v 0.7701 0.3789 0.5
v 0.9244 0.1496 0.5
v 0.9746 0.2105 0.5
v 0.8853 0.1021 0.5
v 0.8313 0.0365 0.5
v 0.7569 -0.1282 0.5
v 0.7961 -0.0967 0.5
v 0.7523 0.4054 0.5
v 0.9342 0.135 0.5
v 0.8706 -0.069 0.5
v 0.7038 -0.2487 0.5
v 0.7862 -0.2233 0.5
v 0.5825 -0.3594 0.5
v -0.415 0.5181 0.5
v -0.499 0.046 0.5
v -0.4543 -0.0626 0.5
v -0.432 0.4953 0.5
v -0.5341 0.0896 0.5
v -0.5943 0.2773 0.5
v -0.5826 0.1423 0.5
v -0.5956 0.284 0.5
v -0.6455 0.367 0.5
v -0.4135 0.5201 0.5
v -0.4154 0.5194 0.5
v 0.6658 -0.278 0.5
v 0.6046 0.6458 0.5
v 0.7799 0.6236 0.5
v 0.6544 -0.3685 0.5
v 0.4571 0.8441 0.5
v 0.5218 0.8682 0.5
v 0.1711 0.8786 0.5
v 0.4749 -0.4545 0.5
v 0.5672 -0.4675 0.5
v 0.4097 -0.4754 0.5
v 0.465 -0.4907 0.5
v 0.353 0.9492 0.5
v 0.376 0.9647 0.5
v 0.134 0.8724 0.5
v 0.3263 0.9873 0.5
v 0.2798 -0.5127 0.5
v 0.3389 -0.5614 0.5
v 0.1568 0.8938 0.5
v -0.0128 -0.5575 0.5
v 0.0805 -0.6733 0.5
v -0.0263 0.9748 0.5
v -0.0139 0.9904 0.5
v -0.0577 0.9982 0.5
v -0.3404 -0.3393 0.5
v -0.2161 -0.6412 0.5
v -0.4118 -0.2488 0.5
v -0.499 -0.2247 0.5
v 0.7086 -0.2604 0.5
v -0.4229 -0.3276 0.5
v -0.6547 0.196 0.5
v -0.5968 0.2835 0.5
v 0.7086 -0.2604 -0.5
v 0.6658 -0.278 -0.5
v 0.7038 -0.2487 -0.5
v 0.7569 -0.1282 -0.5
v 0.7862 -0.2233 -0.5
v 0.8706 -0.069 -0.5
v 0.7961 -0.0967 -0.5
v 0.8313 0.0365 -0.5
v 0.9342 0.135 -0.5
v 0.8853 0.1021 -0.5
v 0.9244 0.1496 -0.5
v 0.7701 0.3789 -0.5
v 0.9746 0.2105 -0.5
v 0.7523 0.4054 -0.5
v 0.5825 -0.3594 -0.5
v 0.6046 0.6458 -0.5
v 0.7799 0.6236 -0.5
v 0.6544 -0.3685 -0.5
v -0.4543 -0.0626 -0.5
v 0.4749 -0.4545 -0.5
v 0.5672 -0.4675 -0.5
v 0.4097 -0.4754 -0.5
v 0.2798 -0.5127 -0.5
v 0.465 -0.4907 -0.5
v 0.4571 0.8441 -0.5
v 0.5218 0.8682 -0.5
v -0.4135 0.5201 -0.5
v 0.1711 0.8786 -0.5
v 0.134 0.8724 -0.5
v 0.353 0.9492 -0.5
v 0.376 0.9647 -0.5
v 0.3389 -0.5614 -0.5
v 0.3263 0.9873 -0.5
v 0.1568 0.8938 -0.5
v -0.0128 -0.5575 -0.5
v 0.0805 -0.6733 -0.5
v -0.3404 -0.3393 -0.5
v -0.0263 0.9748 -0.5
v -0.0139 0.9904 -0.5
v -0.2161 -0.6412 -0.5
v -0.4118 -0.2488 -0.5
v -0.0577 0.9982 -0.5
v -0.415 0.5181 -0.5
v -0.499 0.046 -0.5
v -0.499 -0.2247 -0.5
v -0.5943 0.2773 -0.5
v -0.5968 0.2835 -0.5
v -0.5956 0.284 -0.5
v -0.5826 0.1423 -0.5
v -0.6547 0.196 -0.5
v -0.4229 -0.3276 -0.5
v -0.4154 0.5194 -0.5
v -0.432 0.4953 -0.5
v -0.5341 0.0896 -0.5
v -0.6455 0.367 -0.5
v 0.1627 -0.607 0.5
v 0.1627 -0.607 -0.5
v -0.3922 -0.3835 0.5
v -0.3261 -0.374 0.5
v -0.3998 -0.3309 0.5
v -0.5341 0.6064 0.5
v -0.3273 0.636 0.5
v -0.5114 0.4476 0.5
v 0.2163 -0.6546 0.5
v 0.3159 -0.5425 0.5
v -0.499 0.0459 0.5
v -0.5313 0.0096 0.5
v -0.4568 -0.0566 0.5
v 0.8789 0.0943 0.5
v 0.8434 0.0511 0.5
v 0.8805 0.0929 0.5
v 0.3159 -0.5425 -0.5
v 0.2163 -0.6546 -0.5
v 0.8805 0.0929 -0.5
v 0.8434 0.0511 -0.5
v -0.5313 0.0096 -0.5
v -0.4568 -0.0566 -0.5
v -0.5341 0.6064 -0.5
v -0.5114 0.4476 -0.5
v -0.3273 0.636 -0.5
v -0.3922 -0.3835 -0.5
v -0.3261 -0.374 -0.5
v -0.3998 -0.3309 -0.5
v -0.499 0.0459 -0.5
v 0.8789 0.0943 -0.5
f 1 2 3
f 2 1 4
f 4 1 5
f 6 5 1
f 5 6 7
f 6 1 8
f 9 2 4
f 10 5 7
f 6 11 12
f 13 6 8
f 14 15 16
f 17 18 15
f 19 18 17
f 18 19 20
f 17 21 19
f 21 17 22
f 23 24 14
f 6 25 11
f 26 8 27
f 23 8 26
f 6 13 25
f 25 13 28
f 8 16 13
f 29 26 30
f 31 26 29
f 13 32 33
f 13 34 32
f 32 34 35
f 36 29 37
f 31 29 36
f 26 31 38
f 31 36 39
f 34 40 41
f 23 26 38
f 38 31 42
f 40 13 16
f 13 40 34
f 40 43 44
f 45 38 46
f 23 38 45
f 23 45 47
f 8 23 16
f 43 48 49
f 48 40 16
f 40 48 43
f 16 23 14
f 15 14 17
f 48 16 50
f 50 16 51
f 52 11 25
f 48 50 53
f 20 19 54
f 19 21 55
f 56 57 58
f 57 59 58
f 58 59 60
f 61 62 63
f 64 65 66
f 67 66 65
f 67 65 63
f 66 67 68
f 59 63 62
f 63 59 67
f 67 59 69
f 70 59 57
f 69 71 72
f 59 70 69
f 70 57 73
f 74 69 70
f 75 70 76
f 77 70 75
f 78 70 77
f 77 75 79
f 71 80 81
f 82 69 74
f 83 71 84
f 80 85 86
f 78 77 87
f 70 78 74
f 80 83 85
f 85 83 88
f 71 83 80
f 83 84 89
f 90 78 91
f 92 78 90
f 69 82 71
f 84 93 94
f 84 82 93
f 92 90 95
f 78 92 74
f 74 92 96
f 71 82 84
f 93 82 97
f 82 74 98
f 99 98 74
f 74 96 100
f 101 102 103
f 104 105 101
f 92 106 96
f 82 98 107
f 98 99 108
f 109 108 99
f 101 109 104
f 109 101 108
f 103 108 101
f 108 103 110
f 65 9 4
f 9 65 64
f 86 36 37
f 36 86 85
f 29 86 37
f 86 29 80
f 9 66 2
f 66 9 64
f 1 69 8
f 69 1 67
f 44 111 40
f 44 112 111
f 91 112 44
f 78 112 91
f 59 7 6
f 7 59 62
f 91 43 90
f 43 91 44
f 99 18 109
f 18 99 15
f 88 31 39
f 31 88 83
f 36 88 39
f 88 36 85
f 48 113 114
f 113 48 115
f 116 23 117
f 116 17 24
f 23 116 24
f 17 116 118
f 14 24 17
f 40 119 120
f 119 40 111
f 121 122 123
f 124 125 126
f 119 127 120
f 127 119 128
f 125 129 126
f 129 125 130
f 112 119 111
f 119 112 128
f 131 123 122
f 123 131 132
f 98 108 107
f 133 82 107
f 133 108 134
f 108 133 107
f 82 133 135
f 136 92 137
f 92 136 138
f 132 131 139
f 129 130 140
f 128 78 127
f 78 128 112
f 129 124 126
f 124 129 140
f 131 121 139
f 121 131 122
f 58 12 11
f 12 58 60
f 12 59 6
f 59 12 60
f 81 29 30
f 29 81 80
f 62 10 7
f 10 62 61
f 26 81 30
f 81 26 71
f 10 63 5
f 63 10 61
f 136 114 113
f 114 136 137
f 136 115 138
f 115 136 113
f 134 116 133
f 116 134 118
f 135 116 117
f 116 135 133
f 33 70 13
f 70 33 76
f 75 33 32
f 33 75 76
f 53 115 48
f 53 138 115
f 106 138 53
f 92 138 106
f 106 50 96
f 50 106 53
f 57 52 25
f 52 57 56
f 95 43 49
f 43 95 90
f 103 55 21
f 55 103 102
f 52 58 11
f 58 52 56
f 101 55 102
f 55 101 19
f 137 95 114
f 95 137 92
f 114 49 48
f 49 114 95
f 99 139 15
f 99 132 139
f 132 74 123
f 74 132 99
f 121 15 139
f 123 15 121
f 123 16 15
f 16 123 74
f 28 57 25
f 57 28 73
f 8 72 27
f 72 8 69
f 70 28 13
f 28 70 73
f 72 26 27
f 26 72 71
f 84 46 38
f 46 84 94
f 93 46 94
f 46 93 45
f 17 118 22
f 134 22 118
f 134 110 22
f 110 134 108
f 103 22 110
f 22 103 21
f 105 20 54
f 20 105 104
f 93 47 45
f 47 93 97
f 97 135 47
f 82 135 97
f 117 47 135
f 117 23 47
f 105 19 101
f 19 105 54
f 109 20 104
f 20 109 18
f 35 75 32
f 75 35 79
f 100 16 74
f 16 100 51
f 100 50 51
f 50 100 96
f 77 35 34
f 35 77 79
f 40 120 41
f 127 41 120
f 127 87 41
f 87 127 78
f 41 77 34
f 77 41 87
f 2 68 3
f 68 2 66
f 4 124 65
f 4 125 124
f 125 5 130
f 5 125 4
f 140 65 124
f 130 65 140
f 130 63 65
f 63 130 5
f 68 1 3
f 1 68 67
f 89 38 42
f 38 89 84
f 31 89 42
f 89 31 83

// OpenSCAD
seed = 0;
n = 20;
alphas = rands(0,360.0,n,seed);
off_x = rands(0,0.3,n);
off_y = rands(0,0.3,n);
intersection() {
   for(i=[0:n-1])
      translate([off_x[i], off_y[i], 0.0])
         rotate(alphas[i])
            cube(center=true);
}
